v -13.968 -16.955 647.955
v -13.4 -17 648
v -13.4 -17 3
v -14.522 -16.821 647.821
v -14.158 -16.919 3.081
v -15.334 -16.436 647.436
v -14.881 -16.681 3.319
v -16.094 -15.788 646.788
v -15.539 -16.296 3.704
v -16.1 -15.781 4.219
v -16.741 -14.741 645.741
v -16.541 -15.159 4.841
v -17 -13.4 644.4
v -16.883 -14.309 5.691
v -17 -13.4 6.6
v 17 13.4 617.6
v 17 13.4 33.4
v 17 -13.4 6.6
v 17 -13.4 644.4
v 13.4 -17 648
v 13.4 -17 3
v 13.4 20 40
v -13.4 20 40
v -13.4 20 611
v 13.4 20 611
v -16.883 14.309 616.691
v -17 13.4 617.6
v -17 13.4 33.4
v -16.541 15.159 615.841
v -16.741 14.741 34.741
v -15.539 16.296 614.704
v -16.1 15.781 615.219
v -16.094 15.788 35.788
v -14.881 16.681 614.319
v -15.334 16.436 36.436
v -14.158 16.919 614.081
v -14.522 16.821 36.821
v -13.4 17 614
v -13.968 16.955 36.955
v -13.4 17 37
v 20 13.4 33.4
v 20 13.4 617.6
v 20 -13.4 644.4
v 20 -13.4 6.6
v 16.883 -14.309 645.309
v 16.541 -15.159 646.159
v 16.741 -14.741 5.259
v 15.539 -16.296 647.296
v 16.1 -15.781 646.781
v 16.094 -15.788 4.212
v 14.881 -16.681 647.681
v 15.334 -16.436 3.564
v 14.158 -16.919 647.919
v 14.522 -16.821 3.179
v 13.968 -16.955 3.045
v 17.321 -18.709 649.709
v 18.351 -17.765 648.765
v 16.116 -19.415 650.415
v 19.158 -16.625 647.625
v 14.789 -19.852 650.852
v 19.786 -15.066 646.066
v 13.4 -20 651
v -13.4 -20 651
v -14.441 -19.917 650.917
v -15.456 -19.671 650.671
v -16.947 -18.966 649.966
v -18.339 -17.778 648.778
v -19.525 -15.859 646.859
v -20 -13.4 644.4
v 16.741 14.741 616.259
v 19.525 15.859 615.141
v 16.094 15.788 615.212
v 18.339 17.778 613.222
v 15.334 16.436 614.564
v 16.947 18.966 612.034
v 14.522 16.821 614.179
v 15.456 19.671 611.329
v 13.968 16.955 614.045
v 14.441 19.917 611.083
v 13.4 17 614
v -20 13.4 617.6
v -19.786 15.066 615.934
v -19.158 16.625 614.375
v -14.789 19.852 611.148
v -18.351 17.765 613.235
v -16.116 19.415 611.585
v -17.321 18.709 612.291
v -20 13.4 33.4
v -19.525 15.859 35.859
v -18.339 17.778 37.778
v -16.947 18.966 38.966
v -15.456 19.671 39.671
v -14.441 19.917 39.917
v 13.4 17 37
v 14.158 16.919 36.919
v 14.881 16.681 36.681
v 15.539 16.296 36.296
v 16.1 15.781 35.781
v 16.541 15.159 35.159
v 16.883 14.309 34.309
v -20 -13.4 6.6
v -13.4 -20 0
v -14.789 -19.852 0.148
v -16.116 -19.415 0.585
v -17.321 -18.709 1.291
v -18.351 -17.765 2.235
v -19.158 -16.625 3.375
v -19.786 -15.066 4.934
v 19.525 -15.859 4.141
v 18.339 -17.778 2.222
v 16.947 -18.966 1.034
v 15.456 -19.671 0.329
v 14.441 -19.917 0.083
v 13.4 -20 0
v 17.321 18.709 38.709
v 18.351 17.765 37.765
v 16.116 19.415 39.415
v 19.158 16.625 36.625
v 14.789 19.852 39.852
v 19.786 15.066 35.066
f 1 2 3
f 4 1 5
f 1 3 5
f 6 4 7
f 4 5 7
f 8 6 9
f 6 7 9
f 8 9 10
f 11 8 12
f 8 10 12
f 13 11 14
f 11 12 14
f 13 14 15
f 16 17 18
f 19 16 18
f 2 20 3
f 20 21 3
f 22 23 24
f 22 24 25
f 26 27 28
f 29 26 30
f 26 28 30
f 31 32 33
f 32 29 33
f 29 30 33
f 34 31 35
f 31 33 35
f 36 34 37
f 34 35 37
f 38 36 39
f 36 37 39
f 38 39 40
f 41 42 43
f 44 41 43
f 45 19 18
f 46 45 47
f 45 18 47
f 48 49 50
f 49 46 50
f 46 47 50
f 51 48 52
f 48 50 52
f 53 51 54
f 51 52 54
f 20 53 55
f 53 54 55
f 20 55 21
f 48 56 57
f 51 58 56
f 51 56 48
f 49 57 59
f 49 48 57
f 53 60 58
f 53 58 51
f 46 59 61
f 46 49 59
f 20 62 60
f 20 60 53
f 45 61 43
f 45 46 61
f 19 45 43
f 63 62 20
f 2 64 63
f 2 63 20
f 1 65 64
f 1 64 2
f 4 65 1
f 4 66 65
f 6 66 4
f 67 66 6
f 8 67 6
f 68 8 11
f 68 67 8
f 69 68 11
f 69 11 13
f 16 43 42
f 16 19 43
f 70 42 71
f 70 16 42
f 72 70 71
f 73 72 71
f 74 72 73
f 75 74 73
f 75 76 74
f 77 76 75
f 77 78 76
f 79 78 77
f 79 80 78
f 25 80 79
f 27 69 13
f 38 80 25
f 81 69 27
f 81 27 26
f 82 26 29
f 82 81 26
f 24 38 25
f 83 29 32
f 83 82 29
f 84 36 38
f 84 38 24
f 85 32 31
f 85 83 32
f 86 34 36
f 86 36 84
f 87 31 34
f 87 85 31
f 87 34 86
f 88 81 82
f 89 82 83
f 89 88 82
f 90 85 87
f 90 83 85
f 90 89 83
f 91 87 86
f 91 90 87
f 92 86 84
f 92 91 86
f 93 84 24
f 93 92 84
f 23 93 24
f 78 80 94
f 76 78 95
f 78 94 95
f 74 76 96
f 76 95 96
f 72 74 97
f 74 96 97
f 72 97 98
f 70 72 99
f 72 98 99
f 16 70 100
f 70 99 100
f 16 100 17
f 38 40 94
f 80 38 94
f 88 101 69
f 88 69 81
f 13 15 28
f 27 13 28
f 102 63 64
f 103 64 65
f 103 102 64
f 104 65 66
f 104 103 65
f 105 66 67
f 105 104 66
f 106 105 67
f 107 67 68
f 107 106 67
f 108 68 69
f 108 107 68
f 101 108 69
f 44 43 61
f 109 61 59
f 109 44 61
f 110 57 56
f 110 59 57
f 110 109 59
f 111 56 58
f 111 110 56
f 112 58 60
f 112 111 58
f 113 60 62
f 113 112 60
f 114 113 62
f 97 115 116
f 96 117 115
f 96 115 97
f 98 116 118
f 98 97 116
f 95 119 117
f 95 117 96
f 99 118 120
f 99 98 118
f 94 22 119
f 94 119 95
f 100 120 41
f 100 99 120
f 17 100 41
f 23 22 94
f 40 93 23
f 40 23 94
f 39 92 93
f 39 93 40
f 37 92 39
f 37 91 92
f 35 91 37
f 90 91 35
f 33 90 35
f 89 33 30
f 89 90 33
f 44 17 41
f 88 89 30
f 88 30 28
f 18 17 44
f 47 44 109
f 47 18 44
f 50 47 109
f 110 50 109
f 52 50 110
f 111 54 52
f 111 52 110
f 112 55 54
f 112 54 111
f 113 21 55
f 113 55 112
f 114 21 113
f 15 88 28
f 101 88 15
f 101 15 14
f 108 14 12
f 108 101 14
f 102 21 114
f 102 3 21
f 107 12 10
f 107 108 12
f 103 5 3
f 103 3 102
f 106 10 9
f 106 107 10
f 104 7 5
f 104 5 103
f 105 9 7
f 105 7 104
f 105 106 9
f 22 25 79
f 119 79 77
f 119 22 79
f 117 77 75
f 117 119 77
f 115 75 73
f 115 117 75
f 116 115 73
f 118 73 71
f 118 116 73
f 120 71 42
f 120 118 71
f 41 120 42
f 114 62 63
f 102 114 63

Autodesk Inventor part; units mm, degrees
ref_plane "Start plane" through (0, 0, 0) normal (0, 0, 1) x (1, 0, 0)
ref_plane "End plane" through (0, 0, 651) normal (0, 0, 1) x (1, 0, 0)
sketch "Sketch" plane through (0, 0, 0) normal (0, 0, 1) x (1, 0, 0)
  line L0 (-20, -13.4) -> (-20, 13.4)
  line L1 (-13.4, 20) -> (13.4, 20)
  line L2 (20, 13.4) -> (20, -13.4)
  line L3 (13.4, -20) -> (-13.4, -20)
  arc A0 (-20, -13.4) -> (-13.4, -20) centre (-13.4, -13.4) ccw
  arc A1 (-13.4, 20) -> (-20, 13.4) centre (-13.4, 13.4) ccw
  arc A2 (20, 13.4) -> (13.4, 20) centre (13.4, 13.4) ccw
  arc A3 (13.4, -20) -> (20, -13.4) centre (13.4, -13.4) ccw
  arc A4 (-13.4, 17) -> (-17, 13.4) centre (-13.4, 13.4) ccw
  line L4 (-13.4, 17) -> (13.4, 17)
  arc A5 (17, 13.4) -> (13.4, 17) centre (13.4, 13.4) ccw
  line L5 (17, 13.4) -> (17, -13.4)
  arc A6 (13.4, -17) -> (17, -13.4) centre (13.4, -13.4) ccw
  line L6 (13.4, -17) -> (-13.4, -17)
  arc A7 (-17, -13.4) -> (-13.4, -17) centre (-13.4, -13.4) ccw
  line L7 (-17, -13.4) -> (-17, 13.4)
  line L8 (0, 22.0873) -> (0, -22.0873) construction
  line L9 (-22.0873, 0) -> (22.0873, 0) construction
  dimension "d7" = 6.6
  dimension "d10" = 40
  dimension "d11" = 40
  dimension "d12" = 3
  dimension "d15" = 20
  dimension "d16" = 20
extrude "Body" add sketch "Sketch" along normal up to surface (651 mm away) from surface at 0
sketch "Sketch3" plane through (0, 0, 0) normal (0, 0, 1) x (1, 0, 0)
  line L0 (0, 0) -> (10, 0)
ref_plane "Work Plane3" through (0, 0, 0) normal (0, -1, 0) x (1, 0, 0)
sketch "Sketch4" plane through (0, 0, 0) normal (0, -1, 0) x (1, 0, 0)
  line L0 (-2, 0) -> (12, 0)
  line L1 (-2, 651) -> (12, 651)
  dimension "d18" = 651
ref_plane "Work Plane4" through (0, -20, 0) normal (0, 0.7071, -0.7071) x (1, 0, 0)
split "Split1" plane through (0, -20, 0) removes the side toward (0, 0.7071, -0.7071)
ref_plane "Work Plane5" through (0, -20, 651) normal (0, 0.7071, 0.7071) x (1, 0, 0)
split "Split2" plane through (0, -20, 651) removes the side toward (0, 0.7071, 0.7071)
equation "\"d7\" = G_IR"
equation "\"d10\" = G_H"
equation "\"d11\" = G_W"
equation "\"d12\" = G_T"
equation "\"d15\" = 0.5 * d10"
equation "\"d16\" = 0.5 * d11"
equation "\"d3\" = G_L"
equation "\"G_W\" = 40"
equation "\"G_H\" = 40"
equation "\"G_T\" = 3"
equation "\"G_IR\" = 6.6"
equation "\"G_L\" = d18"
equation "\"G_OFFSET_START\" = 0"
equation "\"G_OFFSET_END\" = 0"
equation "\"d14\" = G_OFFSET_END + B_L"
equation "\"B_L\" = 651"
properties part number "DIN EN 10305-5 - 40 x 40 x 3  - 651" material "Steel, Mild"
